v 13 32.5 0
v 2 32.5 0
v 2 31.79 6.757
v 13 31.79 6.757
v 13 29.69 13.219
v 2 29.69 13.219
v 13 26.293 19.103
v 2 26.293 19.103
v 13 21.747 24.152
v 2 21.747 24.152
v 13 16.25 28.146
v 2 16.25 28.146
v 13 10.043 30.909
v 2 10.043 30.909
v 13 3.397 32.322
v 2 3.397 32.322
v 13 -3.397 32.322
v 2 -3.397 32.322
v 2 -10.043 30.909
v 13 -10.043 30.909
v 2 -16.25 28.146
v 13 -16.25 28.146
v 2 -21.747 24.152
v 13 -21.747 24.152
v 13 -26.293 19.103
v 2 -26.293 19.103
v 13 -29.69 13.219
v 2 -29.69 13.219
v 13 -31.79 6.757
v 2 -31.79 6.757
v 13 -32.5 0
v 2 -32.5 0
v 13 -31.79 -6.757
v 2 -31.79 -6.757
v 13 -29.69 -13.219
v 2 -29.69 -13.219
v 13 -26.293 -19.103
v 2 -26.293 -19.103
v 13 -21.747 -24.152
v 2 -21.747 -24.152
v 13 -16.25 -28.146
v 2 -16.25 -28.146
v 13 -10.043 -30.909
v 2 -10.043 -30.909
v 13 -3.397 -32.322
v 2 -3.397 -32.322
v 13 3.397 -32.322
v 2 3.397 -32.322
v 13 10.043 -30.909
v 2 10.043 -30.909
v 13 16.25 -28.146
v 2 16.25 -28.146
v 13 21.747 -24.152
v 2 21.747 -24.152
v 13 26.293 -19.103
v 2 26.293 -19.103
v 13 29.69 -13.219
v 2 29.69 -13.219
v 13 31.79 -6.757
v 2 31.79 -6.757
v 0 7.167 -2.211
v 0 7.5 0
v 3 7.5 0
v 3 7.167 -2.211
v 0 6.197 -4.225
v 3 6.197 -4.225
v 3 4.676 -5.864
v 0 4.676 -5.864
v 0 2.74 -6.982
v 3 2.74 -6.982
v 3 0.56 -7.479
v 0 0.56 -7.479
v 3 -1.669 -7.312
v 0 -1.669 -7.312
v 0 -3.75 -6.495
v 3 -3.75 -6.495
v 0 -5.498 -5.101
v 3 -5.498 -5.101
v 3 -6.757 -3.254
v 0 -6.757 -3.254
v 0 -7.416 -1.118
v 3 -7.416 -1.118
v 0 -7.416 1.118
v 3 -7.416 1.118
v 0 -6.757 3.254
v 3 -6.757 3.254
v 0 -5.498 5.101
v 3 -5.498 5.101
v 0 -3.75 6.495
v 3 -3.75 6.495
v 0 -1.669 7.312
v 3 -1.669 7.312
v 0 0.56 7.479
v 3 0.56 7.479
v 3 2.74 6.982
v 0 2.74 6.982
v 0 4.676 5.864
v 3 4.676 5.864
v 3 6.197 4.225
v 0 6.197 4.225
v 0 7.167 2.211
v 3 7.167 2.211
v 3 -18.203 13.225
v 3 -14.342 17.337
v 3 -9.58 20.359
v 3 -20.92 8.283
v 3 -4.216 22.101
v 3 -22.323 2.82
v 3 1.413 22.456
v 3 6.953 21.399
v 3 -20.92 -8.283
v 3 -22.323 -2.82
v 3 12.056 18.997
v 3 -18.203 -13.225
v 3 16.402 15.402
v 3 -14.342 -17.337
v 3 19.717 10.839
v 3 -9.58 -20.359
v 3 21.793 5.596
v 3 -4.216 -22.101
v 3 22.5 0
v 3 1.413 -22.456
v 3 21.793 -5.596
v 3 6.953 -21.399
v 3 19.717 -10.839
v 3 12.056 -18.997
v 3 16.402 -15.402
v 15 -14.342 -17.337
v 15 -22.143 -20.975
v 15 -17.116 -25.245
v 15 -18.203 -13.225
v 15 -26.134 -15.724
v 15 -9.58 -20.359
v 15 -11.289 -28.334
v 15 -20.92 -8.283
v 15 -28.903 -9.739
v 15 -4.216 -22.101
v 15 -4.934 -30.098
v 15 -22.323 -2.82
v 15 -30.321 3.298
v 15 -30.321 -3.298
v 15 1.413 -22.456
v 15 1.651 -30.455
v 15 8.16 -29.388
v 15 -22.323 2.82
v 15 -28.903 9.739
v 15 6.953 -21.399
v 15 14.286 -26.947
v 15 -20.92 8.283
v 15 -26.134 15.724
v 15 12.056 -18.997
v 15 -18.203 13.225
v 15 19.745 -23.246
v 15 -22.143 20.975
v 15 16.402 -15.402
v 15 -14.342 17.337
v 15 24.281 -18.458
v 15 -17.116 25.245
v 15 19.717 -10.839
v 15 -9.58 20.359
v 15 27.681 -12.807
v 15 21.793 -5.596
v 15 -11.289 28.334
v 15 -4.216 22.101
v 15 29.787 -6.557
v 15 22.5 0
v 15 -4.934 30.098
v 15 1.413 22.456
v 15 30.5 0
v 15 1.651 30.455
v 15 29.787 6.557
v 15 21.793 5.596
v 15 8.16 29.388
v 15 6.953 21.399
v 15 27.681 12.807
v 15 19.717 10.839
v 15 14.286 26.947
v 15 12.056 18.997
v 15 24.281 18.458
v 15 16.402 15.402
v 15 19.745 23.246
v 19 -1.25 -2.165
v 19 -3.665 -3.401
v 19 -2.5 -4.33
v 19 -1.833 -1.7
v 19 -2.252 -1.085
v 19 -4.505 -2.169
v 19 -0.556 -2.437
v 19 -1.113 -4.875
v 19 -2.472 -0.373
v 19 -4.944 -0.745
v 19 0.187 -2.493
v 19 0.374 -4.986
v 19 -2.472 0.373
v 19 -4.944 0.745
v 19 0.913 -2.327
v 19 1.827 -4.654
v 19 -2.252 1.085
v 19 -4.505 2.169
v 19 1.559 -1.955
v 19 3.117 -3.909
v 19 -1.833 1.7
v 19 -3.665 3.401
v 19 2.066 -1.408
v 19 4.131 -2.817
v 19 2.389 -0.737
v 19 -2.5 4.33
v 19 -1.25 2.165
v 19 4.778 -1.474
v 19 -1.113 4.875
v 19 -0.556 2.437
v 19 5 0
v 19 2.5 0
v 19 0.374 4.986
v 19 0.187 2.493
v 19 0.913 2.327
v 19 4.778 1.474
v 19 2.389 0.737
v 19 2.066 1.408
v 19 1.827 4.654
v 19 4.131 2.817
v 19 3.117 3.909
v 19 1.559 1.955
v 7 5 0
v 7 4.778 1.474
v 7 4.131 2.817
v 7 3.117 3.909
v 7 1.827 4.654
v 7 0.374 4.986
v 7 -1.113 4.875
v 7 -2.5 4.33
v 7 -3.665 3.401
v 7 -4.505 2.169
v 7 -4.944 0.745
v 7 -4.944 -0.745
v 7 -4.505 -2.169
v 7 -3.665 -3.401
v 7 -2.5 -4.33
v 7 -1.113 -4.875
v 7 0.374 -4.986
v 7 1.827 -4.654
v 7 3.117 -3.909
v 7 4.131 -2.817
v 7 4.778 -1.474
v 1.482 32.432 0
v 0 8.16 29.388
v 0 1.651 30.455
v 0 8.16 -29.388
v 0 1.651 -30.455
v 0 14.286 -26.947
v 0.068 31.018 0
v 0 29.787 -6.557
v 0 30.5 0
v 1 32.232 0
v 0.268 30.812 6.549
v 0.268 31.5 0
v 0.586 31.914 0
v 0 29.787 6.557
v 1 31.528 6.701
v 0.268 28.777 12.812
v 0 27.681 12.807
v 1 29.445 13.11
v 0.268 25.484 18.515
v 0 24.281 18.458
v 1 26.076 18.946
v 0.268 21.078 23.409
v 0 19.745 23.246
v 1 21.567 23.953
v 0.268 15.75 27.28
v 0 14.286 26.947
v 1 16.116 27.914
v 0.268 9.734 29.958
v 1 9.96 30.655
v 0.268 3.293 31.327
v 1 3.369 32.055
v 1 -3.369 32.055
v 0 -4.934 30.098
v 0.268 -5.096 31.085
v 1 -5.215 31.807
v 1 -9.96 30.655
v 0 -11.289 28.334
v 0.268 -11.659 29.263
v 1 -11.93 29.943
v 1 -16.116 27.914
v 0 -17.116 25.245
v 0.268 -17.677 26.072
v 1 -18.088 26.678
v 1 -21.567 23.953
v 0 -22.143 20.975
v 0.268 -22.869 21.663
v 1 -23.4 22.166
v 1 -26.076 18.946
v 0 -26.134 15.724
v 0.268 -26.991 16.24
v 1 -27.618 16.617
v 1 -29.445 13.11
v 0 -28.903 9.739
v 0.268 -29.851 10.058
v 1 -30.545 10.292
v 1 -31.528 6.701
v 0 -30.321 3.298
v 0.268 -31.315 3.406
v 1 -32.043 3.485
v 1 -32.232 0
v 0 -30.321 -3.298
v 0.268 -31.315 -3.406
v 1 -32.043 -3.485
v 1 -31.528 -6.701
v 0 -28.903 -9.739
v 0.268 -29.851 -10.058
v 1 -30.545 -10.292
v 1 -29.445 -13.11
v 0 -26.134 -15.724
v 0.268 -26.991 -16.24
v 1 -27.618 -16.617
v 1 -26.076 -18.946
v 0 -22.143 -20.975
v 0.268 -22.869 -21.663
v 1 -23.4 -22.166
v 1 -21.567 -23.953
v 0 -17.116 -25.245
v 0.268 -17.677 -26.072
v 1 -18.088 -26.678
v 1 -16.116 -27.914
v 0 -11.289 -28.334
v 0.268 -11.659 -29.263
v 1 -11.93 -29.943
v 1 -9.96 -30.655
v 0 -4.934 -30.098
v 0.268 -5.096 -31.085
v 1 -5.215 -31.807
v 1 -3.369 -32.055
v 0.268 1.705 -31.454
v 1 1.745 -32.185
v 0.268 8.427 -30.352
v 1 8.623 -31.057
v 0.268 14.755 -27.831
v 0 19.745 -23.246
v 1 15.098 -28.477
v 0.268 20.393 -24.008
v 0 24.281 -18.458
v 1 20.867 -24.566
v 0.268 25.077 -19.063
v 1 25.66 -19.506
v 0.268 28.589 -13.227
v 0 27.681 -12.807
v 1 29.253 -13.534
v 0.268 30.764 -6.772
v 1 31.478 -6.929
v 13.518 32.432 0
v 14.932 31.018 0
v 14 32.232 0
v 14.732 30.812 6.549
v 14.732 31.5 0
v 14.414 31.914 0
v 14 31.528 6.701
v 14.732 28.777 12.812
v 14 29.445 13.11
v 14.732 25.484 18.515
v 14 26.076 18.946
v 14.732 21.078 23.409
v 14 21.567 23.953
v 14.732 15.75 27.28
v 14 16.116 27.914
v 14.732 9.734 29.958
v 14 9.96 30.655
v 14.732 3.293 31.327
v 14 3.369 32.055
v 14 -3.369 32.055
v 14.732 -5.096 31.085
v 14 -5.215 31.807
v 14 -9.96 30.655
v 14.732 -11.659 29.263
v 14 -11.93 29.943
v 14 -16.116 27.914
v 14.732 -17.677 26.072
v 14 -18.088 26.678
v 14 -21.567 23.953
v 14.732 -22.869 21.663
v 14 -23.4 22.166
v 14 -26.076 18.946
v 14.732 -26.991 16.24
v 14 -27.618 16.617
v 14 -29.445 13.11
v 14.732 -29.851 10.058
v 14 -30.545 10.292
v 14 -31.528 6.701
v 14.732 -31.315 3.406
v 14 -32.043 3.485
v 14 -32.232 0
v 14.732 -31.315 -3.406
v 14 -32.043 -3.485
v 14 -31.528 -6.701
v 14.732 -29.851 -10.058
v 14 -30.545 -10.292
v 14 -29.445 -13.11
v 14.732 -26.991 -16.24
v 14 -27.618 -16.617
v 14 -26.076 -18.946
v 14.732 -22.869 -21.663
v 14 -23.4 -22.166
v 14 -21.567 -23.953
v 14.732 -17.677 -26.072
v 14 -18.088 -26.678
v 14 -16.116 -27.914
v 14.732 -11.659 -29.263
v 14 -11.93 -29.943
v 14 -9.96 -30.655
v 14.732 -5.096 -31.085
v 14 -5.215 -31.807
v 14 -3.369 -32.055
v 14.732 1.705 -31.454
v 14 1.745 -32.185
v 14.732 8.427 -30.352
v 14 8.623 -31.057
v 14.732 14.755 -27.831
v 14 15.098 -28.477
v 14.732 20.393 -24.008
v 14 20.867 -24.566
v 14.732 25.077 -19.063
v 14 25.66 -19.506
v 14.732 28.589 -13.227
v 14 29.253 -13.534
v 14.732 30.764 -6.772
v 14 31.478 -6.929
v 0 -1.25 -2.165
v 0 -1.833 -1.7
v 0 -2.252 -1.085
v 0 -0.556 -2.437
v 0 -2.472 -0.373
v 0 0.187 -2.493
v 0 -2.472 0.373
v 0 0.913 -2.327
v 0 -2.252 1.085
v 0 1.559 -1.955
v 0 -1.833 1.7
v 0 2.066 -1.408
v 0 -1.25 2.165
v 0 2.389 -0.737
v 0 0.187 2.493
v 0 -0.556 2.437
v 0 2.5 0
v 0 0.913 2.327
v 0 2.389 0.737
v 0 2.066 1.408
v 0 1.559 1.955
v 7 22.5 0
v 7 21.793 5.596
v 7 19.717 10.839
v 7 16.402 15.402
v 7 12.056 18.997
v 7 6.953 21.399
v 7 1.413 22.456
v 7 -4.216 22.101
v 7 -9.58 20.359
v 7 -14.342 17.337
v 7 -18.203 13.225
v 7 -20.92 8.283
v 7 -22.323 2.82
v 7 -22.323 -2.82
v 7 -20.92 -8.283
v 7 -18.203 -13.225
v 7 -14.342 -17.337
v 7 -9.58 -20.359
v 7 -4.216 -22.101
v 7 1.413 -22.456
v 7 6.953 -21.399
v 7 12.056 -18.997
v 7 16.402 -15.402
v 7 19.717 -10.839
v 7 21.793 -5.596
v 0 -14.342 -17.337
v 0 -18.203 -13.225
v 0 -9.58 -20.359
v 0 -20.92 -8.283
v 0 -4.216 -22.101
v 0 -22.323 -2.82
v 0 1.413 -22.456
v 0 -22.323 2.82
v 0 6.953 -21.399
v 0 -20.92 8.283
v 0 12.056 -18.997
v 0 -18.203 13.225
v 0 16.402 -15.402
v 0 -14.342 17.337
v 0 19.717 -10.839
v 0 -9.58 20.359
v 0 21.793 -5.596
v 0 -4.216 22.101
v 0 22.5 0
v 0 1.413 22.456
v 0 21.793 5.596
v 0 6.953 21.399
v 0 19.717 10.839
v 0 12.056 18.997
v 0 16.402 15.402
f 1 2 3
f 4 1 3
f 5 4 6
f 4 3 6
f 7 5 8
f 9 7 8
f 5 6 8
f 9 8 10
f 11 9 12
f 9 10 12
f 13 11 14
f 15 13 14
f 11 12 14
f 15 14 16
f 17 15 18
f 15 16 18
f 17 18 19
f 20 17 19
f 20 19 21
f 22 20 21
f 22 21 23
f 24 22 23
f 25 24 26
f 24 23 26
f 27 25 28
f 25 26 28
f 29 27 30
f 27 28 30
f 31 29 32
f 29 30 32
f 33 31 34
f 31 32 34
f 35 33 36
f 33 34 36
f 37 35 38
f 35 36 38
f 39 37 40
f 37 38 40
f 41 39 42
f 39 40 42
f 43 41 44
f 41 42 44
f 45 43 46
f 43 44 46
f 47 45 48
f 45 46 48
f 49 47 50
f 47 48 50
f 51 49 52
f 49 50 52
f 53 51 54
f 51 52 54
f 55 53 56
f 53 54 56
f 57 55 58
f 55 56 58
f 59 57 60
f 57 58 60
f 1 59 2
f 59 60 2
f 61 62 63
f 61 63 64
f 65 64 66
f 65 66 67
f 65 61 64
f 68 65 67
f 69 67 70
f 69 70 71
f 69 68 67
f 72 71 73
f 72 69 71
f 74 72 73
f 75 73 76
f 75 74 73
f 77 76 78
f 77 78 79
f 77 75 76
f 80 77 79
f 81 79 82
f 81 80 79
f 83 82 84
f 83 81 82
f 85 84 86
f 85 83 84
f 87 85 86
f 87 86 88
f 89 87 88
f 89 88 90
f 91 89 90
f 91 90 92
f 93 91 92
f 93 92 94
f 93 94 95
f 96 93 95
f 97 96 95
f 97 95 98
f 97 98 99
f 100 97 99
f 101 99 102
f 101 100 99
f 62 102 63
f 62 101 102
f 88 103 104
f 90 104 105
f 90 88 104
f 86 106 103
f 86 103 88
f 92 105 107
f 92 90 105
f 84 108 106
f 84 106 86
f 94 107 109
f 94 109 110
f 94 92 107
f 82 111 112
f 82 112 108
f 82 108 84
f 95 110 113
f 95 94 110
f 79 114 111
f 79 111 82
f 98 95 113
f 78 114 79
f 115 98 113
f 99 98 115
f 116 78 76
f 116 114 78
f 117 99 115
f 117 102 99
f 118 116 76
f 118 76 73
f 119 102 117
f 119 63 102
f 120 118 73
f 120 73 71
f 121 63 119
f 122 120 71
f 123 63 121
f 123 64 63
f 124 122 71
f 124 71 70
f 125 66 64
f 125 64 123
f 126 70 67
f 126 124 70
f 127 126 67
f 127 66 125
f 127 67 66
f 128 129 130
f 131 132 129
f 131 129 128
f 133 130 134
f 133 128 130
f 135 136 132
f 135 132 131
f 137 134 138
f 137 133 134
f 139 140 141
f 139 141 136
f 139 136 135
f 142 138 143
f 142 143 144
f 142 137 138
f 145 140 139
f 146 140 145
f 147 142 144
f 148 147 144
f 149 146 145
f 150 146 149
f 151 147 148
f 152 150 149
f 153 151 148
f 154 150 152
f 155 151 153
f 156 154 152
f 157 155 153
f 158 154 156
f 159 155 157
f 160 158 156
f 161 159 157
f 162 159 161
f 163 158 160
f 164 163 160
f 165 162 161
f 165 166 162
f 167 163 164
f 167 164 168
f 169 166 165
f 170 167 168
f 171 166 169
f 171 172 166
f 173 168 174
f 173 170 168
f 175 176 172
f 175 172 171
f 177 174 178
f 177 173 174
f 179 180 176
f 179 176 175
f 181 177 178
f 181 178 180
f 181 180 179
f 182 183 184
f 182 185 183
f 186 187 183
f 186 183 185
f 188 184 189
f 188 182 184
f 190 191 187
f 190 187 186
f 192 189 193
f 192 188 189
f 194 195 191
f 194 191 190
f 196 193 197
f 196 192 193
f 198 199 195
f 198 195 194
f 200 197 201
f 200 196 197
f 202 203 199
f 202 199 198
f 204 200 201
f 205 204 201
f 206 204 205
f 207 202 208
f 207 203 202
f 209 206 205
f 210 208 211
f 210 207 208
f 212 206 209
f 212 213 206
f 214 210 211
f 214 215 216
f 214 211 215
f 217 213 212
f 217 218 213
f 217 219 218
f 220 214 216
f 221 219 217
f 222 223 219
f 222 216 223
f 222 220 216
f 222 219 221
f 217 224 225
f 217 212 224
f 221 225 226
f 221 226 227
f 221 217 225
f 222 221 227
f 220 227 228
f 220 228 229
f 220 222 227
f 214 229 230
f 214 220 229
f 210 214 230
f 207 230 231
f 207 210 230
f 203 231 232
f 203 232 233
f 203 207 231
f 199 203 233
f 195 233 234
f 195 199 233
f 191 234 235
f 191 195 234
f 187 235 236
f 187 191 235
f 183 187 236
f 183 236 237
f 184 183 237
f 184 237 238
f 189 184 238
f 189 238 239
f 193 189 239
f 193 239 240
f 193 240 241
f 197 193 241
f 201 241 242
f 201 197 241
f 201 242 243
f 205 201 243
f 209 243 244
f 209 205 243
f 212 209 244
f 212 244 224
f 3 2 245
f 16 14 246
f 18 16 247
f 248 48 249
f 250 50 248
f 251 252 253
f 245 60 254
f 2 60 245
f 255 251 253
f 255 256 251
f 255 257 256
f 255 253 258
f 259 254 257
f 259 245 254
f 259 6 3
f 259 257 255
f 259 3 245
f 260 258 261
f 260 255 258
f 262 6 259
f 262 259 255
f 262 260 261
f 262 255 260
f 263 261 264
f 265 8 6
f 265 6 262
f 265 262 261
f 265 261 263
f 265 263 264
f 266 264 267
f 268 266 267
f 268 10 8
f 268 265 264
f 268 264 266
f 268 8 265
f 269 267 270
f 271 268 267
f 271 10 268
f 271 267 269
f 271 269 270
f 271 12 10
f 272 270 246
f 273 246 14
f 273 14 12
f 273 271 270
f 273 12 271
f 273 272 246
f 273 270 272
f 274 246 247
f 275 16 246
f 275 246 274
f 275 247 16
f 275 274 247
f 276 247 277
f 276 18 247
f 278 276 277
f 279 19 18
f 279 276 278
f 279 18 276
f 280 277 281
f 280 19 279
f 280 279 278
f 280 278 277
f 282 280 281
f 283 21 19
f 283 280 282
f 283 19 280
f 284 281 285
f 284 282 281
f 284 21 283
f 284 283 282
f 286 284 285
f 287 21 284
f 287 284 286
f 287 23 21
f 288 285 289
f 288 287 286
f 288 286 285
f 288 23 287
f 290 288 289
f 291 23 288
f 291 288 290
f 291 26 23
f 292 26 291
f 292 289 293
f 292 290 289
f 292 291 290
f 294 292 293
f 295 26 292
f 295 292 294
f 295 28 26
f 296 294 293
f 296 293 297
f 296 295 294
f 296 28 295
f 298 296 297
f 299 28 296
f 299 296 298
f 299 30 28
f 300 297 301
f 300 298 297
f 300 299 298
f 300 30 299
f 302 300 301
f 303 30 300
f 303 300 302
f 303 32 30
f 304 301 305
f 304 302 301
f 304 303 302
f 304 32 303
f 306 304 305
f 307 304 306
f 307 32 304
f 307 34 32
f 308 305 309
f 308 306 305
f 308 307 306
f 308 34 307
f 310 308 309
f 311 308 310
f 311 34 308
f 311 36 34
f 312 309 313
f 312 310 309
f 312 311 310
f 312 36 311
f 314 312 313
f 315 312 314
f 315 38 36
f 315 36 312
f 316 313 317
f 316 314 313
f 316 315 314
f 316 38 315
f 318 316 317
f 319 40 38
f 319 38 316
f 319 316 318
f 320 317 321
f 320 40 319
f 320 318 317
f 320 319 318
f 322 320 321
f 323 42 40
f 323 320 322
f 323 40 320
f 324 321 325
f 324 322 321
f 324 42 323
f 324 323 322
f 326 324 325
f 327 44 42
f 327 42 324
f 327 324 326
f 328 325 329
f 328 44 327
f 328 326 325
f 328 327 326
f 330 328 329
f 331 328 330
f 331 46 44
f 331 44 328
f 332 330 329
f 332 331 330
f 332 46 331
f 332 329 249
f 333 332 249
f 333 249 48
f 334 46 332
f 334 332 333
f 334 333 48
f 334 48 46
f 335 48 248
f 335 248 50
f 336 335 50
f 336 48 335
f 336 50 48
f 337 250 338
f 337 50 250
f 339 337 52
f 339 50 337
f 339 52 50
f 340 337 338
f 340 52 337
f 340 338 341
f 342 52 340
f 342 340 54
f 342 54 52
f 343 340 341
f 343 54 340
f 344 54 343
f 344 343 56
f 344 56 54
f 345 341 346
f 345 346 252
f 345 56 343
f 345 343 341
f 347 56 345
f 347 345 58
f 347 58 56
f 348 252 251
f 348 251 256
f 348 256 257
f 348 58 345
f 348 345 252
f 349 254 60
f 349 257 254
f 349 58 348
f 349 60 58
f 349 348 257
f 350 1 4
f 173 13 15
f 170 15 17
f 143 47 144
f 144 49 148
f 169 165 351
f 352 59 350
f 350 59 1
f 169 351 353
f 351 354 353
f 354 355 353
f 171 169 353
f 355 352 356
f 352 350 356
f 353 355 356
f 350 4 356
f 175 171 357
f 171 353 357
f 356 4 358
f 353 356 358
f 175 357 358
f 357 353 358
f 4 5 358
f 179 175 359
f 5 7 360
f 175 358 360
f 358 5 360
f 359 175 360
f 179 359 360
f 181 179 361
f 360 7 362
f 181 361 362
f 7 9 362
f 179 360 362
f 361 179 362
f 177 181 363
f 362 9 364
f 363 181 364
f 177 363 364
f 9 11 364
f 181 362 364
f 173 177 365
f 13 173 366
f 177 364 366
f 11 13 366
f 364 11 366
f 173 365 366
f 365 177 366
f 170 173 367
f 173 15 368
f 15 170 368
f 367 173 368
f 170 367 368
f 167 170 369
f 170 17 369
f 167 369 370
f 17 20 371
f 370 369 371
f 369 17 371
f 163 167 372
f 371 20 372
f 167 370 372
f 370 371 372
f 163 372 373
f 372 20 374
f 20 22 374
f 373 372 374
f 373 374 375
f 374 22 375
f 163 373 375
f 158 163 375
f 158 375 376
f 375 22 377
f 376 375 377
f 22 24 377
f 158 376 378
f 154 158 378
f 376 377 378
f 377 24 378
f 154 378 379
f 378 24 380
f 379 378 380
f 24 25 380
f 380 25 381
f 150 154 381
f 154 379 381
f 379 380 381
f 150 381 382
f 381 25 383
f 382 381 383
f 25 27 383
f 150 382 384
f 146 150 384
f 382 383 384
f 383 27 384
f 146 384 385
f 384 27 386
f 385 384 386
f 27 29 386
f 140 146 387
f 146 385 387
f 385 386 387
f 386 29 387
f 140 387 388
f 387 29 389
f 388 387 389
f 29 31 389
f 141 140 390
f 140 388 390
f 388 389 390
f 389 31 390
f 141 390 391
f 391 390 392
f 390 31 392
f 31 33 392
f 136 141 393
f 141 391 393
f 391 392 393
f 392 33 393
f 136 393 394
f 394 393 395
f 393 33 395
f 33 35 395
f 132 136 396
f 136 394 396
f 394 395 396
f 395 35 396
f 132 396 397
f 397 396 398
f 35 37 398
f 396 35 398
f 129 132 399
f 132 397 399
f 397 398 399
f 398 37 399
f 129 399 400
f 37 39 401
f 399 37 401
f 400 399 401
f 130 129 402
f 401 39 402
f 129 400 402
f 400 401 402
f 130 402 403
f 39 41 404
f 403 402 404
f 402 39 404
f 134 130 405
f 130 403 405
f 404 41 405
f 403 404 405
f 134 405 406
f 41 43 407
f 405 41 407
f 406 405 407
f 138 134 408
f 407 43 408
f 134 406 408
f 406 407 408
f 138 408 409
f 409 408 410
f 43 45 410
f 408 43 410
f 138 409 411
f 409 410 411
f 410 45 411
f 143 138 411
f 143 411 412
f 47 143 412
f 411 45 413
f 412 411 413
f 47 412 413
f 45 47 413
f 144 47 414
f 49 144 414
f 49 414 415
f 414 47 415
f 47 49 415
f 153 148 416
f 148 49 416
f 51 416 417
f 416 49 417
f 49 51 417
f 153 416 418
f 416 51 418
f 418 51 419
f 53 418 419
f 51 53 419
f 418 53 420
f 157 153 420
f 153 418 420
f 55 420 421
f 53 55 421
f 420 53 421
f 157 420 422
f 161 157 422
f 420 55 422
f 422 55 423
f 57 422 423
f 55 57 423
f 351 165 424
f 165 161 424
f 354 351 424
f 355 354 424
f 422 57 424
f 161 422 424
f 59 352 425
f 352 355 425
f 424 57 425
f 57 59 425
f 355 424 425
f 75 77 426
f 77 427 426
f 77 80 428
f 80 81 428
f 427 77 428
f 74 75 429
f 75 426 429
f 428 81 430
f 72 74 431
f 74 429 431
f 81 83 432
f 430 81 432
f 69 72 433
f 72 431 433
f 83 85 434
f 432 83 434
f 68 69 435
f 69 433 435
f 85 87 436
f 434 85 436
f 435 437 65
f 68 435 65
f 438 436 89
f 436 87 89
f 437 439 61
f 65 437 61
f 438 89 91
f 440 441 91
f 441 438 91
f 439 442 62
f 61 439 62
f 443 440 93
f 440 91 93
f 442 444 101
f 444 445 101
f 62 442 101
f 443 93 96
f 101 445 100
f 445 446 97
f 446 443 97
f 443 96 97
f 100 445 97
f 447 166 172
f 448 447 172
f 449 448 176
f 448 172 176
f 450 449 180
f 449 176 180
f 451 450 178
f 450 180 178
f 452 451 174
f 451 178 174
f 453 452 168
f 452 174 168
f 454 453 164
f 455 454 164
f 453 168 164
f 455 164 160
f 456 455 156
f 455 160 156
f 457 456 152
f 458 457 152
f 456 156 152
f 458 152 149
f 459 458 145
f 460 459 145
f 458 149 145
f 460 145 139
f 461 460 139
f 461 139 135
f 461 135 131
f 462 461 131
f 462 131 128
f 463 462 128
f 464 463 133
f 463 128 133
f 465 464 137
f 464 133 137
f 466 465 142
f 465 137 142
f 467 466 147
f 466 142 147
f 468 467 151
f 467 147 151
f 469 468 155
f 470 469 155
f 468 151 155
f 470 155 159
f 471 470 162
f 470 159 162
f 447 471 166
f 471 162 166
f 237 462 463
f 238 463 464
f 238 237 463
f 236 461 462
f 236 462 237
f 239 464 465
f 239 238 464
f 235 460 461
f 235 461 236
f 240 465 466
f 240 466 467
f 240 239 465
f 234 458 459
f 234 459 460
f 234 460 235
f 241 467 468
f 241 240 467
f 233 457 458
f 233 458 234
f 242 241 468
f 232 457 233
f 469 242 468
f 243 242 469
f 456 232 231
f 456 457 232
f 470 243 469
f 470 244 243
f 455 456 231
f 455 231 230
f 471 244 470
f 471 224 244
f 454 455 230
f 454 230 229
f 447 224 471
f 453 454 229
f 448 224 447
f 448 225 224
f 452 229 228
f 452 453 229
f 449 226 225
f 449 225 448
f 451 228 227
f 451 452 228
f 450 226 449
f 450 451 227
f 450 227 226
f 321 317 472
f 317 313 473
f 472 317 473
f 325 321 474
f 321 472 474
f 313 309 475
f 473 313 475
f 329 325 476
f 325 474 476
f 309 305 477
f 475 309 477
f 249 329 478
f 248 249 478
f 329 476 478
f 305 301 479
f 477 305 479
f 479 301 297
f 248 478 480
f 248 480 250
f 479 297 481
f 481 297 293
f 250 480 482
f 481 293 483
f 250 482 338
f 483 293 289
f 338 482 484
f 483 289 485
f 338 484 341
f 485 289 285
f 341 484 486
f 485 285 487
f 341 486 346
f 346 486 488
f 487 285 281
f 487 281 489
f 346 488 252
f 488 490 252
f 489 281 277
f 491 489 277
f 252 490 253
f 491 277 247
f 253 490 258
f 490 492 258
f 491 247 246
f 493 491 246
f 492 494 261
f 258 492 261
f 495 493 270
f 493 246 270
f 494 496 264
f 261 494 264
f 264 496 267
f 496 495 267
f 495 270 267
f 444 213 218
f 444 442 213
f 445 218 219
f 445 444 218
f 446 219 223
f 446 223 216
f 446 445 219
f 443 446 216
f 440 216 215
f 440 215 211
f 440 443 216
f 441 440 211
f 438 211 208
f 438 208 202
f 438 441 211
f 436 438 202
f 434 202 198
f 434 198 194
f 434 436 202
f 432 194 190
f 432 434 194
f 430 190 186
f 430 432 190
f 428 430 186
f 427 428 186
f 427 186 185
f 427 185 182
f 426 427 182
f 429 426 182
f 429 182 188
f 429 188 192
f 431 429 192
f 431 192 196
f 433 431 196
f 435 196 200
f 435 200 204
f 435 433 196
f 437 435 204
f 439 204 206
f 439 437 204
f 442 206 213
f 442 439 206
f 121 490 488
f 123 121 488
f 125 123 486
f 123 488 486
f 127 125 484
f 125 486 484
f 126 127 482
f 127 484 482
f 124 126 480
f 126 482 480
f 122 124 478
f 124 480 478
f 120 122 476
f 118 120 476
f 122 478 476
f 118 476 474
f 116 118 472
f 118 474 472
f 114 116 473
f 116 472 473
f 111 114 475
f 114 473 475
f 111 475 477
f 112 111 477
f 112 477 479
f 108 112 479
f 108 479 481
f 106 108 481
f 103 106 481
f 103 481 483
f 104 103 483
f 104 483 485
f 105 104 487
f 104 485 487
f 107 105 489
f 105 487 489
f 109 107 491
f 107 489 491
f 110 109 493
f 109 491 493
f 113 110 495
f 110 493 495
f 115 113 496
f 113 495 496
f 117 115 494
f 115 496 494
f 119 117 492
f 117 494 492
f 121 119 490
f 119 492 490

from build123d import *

# Parameters (mm, degrees)
SKETCH_R        = 32.5
SKETCH_R_2      = 2.5
PAD_DEPTH       = 15
SKETCH001_R     = 5
SKETCH001_R_2   = 2.5
PAD001_DEPTH    = 4
SKETCH002_R     = 22.5
SKETCH002_R_2   = 7.5
POCKET_DEPTH    = 3
SKETCH003_R     = 22.5
SKETCH003_R_2   = 5
POCKET001_DEPTH = 8
FILLET_R        = 2
FILLET001_R     = 2


with BuildPart() as part:
    # Sketch → Pad (new body)
    with BuildSketch(Plane.YZ):
        Circle(SKETCH_R)
        Circle(SKETCH_R_2, mode=Mode.SUBTRACT)
    extrude(amount=PAD_DEPTH)

    # Sketch001 (on Face4 of Pad) → Pad001 (join)
    with BuildSketch(Plane.YZ.offset(15)):
        Circle(SKETCH001_R)
        Circle(SKETCH001_R_2, mode=Mode.SUBTRACT)
    extrude(amount=PAD001_DEPTH)

    # Sketch002 (on Face2 of Pad001) → Pocket (cut)
    with BuildSketch(Plane(origin=(0, 0, 0), x_dir=(0, 1, 0), z_dir=(-1, 0, 0))):
        Circle(SKETCH002_R)
        Circle(SKETCH002_R_2, mode=Mode.SUBTRACT)
    extrude(amount=-POCKET_DEPTH, mode=Mode.SUBTRACT)

    # Sketch003 (on Face3 of Pocket) → Pocket001 (cut)
    with BuildSketch(Plane.YZ.offset(15)):
        Circle(SKETCH003_R)
        Circle(SKETCH003_R_2, mode=Mode.SUBTRACT)
    extrude(amount=-POCKET001_DEPTH, mode=Mode.SUBTRACT)

    # Fillet
    fillet_edges = [part.edges().sort_by_distance(p)[0] for p in [
        (15, -32.5, 0),
    ]]
    fillet(fillet_edges, radius=FILLET_R)

    # Fillet001
    fillet001_edges = [part.edges().sort_by_distance(p)[0] for p in [
        (0, -32.5, 0),
    ]]
    fillet(fillet001_edges, radius=FILLET001_R)


solid = part.part
